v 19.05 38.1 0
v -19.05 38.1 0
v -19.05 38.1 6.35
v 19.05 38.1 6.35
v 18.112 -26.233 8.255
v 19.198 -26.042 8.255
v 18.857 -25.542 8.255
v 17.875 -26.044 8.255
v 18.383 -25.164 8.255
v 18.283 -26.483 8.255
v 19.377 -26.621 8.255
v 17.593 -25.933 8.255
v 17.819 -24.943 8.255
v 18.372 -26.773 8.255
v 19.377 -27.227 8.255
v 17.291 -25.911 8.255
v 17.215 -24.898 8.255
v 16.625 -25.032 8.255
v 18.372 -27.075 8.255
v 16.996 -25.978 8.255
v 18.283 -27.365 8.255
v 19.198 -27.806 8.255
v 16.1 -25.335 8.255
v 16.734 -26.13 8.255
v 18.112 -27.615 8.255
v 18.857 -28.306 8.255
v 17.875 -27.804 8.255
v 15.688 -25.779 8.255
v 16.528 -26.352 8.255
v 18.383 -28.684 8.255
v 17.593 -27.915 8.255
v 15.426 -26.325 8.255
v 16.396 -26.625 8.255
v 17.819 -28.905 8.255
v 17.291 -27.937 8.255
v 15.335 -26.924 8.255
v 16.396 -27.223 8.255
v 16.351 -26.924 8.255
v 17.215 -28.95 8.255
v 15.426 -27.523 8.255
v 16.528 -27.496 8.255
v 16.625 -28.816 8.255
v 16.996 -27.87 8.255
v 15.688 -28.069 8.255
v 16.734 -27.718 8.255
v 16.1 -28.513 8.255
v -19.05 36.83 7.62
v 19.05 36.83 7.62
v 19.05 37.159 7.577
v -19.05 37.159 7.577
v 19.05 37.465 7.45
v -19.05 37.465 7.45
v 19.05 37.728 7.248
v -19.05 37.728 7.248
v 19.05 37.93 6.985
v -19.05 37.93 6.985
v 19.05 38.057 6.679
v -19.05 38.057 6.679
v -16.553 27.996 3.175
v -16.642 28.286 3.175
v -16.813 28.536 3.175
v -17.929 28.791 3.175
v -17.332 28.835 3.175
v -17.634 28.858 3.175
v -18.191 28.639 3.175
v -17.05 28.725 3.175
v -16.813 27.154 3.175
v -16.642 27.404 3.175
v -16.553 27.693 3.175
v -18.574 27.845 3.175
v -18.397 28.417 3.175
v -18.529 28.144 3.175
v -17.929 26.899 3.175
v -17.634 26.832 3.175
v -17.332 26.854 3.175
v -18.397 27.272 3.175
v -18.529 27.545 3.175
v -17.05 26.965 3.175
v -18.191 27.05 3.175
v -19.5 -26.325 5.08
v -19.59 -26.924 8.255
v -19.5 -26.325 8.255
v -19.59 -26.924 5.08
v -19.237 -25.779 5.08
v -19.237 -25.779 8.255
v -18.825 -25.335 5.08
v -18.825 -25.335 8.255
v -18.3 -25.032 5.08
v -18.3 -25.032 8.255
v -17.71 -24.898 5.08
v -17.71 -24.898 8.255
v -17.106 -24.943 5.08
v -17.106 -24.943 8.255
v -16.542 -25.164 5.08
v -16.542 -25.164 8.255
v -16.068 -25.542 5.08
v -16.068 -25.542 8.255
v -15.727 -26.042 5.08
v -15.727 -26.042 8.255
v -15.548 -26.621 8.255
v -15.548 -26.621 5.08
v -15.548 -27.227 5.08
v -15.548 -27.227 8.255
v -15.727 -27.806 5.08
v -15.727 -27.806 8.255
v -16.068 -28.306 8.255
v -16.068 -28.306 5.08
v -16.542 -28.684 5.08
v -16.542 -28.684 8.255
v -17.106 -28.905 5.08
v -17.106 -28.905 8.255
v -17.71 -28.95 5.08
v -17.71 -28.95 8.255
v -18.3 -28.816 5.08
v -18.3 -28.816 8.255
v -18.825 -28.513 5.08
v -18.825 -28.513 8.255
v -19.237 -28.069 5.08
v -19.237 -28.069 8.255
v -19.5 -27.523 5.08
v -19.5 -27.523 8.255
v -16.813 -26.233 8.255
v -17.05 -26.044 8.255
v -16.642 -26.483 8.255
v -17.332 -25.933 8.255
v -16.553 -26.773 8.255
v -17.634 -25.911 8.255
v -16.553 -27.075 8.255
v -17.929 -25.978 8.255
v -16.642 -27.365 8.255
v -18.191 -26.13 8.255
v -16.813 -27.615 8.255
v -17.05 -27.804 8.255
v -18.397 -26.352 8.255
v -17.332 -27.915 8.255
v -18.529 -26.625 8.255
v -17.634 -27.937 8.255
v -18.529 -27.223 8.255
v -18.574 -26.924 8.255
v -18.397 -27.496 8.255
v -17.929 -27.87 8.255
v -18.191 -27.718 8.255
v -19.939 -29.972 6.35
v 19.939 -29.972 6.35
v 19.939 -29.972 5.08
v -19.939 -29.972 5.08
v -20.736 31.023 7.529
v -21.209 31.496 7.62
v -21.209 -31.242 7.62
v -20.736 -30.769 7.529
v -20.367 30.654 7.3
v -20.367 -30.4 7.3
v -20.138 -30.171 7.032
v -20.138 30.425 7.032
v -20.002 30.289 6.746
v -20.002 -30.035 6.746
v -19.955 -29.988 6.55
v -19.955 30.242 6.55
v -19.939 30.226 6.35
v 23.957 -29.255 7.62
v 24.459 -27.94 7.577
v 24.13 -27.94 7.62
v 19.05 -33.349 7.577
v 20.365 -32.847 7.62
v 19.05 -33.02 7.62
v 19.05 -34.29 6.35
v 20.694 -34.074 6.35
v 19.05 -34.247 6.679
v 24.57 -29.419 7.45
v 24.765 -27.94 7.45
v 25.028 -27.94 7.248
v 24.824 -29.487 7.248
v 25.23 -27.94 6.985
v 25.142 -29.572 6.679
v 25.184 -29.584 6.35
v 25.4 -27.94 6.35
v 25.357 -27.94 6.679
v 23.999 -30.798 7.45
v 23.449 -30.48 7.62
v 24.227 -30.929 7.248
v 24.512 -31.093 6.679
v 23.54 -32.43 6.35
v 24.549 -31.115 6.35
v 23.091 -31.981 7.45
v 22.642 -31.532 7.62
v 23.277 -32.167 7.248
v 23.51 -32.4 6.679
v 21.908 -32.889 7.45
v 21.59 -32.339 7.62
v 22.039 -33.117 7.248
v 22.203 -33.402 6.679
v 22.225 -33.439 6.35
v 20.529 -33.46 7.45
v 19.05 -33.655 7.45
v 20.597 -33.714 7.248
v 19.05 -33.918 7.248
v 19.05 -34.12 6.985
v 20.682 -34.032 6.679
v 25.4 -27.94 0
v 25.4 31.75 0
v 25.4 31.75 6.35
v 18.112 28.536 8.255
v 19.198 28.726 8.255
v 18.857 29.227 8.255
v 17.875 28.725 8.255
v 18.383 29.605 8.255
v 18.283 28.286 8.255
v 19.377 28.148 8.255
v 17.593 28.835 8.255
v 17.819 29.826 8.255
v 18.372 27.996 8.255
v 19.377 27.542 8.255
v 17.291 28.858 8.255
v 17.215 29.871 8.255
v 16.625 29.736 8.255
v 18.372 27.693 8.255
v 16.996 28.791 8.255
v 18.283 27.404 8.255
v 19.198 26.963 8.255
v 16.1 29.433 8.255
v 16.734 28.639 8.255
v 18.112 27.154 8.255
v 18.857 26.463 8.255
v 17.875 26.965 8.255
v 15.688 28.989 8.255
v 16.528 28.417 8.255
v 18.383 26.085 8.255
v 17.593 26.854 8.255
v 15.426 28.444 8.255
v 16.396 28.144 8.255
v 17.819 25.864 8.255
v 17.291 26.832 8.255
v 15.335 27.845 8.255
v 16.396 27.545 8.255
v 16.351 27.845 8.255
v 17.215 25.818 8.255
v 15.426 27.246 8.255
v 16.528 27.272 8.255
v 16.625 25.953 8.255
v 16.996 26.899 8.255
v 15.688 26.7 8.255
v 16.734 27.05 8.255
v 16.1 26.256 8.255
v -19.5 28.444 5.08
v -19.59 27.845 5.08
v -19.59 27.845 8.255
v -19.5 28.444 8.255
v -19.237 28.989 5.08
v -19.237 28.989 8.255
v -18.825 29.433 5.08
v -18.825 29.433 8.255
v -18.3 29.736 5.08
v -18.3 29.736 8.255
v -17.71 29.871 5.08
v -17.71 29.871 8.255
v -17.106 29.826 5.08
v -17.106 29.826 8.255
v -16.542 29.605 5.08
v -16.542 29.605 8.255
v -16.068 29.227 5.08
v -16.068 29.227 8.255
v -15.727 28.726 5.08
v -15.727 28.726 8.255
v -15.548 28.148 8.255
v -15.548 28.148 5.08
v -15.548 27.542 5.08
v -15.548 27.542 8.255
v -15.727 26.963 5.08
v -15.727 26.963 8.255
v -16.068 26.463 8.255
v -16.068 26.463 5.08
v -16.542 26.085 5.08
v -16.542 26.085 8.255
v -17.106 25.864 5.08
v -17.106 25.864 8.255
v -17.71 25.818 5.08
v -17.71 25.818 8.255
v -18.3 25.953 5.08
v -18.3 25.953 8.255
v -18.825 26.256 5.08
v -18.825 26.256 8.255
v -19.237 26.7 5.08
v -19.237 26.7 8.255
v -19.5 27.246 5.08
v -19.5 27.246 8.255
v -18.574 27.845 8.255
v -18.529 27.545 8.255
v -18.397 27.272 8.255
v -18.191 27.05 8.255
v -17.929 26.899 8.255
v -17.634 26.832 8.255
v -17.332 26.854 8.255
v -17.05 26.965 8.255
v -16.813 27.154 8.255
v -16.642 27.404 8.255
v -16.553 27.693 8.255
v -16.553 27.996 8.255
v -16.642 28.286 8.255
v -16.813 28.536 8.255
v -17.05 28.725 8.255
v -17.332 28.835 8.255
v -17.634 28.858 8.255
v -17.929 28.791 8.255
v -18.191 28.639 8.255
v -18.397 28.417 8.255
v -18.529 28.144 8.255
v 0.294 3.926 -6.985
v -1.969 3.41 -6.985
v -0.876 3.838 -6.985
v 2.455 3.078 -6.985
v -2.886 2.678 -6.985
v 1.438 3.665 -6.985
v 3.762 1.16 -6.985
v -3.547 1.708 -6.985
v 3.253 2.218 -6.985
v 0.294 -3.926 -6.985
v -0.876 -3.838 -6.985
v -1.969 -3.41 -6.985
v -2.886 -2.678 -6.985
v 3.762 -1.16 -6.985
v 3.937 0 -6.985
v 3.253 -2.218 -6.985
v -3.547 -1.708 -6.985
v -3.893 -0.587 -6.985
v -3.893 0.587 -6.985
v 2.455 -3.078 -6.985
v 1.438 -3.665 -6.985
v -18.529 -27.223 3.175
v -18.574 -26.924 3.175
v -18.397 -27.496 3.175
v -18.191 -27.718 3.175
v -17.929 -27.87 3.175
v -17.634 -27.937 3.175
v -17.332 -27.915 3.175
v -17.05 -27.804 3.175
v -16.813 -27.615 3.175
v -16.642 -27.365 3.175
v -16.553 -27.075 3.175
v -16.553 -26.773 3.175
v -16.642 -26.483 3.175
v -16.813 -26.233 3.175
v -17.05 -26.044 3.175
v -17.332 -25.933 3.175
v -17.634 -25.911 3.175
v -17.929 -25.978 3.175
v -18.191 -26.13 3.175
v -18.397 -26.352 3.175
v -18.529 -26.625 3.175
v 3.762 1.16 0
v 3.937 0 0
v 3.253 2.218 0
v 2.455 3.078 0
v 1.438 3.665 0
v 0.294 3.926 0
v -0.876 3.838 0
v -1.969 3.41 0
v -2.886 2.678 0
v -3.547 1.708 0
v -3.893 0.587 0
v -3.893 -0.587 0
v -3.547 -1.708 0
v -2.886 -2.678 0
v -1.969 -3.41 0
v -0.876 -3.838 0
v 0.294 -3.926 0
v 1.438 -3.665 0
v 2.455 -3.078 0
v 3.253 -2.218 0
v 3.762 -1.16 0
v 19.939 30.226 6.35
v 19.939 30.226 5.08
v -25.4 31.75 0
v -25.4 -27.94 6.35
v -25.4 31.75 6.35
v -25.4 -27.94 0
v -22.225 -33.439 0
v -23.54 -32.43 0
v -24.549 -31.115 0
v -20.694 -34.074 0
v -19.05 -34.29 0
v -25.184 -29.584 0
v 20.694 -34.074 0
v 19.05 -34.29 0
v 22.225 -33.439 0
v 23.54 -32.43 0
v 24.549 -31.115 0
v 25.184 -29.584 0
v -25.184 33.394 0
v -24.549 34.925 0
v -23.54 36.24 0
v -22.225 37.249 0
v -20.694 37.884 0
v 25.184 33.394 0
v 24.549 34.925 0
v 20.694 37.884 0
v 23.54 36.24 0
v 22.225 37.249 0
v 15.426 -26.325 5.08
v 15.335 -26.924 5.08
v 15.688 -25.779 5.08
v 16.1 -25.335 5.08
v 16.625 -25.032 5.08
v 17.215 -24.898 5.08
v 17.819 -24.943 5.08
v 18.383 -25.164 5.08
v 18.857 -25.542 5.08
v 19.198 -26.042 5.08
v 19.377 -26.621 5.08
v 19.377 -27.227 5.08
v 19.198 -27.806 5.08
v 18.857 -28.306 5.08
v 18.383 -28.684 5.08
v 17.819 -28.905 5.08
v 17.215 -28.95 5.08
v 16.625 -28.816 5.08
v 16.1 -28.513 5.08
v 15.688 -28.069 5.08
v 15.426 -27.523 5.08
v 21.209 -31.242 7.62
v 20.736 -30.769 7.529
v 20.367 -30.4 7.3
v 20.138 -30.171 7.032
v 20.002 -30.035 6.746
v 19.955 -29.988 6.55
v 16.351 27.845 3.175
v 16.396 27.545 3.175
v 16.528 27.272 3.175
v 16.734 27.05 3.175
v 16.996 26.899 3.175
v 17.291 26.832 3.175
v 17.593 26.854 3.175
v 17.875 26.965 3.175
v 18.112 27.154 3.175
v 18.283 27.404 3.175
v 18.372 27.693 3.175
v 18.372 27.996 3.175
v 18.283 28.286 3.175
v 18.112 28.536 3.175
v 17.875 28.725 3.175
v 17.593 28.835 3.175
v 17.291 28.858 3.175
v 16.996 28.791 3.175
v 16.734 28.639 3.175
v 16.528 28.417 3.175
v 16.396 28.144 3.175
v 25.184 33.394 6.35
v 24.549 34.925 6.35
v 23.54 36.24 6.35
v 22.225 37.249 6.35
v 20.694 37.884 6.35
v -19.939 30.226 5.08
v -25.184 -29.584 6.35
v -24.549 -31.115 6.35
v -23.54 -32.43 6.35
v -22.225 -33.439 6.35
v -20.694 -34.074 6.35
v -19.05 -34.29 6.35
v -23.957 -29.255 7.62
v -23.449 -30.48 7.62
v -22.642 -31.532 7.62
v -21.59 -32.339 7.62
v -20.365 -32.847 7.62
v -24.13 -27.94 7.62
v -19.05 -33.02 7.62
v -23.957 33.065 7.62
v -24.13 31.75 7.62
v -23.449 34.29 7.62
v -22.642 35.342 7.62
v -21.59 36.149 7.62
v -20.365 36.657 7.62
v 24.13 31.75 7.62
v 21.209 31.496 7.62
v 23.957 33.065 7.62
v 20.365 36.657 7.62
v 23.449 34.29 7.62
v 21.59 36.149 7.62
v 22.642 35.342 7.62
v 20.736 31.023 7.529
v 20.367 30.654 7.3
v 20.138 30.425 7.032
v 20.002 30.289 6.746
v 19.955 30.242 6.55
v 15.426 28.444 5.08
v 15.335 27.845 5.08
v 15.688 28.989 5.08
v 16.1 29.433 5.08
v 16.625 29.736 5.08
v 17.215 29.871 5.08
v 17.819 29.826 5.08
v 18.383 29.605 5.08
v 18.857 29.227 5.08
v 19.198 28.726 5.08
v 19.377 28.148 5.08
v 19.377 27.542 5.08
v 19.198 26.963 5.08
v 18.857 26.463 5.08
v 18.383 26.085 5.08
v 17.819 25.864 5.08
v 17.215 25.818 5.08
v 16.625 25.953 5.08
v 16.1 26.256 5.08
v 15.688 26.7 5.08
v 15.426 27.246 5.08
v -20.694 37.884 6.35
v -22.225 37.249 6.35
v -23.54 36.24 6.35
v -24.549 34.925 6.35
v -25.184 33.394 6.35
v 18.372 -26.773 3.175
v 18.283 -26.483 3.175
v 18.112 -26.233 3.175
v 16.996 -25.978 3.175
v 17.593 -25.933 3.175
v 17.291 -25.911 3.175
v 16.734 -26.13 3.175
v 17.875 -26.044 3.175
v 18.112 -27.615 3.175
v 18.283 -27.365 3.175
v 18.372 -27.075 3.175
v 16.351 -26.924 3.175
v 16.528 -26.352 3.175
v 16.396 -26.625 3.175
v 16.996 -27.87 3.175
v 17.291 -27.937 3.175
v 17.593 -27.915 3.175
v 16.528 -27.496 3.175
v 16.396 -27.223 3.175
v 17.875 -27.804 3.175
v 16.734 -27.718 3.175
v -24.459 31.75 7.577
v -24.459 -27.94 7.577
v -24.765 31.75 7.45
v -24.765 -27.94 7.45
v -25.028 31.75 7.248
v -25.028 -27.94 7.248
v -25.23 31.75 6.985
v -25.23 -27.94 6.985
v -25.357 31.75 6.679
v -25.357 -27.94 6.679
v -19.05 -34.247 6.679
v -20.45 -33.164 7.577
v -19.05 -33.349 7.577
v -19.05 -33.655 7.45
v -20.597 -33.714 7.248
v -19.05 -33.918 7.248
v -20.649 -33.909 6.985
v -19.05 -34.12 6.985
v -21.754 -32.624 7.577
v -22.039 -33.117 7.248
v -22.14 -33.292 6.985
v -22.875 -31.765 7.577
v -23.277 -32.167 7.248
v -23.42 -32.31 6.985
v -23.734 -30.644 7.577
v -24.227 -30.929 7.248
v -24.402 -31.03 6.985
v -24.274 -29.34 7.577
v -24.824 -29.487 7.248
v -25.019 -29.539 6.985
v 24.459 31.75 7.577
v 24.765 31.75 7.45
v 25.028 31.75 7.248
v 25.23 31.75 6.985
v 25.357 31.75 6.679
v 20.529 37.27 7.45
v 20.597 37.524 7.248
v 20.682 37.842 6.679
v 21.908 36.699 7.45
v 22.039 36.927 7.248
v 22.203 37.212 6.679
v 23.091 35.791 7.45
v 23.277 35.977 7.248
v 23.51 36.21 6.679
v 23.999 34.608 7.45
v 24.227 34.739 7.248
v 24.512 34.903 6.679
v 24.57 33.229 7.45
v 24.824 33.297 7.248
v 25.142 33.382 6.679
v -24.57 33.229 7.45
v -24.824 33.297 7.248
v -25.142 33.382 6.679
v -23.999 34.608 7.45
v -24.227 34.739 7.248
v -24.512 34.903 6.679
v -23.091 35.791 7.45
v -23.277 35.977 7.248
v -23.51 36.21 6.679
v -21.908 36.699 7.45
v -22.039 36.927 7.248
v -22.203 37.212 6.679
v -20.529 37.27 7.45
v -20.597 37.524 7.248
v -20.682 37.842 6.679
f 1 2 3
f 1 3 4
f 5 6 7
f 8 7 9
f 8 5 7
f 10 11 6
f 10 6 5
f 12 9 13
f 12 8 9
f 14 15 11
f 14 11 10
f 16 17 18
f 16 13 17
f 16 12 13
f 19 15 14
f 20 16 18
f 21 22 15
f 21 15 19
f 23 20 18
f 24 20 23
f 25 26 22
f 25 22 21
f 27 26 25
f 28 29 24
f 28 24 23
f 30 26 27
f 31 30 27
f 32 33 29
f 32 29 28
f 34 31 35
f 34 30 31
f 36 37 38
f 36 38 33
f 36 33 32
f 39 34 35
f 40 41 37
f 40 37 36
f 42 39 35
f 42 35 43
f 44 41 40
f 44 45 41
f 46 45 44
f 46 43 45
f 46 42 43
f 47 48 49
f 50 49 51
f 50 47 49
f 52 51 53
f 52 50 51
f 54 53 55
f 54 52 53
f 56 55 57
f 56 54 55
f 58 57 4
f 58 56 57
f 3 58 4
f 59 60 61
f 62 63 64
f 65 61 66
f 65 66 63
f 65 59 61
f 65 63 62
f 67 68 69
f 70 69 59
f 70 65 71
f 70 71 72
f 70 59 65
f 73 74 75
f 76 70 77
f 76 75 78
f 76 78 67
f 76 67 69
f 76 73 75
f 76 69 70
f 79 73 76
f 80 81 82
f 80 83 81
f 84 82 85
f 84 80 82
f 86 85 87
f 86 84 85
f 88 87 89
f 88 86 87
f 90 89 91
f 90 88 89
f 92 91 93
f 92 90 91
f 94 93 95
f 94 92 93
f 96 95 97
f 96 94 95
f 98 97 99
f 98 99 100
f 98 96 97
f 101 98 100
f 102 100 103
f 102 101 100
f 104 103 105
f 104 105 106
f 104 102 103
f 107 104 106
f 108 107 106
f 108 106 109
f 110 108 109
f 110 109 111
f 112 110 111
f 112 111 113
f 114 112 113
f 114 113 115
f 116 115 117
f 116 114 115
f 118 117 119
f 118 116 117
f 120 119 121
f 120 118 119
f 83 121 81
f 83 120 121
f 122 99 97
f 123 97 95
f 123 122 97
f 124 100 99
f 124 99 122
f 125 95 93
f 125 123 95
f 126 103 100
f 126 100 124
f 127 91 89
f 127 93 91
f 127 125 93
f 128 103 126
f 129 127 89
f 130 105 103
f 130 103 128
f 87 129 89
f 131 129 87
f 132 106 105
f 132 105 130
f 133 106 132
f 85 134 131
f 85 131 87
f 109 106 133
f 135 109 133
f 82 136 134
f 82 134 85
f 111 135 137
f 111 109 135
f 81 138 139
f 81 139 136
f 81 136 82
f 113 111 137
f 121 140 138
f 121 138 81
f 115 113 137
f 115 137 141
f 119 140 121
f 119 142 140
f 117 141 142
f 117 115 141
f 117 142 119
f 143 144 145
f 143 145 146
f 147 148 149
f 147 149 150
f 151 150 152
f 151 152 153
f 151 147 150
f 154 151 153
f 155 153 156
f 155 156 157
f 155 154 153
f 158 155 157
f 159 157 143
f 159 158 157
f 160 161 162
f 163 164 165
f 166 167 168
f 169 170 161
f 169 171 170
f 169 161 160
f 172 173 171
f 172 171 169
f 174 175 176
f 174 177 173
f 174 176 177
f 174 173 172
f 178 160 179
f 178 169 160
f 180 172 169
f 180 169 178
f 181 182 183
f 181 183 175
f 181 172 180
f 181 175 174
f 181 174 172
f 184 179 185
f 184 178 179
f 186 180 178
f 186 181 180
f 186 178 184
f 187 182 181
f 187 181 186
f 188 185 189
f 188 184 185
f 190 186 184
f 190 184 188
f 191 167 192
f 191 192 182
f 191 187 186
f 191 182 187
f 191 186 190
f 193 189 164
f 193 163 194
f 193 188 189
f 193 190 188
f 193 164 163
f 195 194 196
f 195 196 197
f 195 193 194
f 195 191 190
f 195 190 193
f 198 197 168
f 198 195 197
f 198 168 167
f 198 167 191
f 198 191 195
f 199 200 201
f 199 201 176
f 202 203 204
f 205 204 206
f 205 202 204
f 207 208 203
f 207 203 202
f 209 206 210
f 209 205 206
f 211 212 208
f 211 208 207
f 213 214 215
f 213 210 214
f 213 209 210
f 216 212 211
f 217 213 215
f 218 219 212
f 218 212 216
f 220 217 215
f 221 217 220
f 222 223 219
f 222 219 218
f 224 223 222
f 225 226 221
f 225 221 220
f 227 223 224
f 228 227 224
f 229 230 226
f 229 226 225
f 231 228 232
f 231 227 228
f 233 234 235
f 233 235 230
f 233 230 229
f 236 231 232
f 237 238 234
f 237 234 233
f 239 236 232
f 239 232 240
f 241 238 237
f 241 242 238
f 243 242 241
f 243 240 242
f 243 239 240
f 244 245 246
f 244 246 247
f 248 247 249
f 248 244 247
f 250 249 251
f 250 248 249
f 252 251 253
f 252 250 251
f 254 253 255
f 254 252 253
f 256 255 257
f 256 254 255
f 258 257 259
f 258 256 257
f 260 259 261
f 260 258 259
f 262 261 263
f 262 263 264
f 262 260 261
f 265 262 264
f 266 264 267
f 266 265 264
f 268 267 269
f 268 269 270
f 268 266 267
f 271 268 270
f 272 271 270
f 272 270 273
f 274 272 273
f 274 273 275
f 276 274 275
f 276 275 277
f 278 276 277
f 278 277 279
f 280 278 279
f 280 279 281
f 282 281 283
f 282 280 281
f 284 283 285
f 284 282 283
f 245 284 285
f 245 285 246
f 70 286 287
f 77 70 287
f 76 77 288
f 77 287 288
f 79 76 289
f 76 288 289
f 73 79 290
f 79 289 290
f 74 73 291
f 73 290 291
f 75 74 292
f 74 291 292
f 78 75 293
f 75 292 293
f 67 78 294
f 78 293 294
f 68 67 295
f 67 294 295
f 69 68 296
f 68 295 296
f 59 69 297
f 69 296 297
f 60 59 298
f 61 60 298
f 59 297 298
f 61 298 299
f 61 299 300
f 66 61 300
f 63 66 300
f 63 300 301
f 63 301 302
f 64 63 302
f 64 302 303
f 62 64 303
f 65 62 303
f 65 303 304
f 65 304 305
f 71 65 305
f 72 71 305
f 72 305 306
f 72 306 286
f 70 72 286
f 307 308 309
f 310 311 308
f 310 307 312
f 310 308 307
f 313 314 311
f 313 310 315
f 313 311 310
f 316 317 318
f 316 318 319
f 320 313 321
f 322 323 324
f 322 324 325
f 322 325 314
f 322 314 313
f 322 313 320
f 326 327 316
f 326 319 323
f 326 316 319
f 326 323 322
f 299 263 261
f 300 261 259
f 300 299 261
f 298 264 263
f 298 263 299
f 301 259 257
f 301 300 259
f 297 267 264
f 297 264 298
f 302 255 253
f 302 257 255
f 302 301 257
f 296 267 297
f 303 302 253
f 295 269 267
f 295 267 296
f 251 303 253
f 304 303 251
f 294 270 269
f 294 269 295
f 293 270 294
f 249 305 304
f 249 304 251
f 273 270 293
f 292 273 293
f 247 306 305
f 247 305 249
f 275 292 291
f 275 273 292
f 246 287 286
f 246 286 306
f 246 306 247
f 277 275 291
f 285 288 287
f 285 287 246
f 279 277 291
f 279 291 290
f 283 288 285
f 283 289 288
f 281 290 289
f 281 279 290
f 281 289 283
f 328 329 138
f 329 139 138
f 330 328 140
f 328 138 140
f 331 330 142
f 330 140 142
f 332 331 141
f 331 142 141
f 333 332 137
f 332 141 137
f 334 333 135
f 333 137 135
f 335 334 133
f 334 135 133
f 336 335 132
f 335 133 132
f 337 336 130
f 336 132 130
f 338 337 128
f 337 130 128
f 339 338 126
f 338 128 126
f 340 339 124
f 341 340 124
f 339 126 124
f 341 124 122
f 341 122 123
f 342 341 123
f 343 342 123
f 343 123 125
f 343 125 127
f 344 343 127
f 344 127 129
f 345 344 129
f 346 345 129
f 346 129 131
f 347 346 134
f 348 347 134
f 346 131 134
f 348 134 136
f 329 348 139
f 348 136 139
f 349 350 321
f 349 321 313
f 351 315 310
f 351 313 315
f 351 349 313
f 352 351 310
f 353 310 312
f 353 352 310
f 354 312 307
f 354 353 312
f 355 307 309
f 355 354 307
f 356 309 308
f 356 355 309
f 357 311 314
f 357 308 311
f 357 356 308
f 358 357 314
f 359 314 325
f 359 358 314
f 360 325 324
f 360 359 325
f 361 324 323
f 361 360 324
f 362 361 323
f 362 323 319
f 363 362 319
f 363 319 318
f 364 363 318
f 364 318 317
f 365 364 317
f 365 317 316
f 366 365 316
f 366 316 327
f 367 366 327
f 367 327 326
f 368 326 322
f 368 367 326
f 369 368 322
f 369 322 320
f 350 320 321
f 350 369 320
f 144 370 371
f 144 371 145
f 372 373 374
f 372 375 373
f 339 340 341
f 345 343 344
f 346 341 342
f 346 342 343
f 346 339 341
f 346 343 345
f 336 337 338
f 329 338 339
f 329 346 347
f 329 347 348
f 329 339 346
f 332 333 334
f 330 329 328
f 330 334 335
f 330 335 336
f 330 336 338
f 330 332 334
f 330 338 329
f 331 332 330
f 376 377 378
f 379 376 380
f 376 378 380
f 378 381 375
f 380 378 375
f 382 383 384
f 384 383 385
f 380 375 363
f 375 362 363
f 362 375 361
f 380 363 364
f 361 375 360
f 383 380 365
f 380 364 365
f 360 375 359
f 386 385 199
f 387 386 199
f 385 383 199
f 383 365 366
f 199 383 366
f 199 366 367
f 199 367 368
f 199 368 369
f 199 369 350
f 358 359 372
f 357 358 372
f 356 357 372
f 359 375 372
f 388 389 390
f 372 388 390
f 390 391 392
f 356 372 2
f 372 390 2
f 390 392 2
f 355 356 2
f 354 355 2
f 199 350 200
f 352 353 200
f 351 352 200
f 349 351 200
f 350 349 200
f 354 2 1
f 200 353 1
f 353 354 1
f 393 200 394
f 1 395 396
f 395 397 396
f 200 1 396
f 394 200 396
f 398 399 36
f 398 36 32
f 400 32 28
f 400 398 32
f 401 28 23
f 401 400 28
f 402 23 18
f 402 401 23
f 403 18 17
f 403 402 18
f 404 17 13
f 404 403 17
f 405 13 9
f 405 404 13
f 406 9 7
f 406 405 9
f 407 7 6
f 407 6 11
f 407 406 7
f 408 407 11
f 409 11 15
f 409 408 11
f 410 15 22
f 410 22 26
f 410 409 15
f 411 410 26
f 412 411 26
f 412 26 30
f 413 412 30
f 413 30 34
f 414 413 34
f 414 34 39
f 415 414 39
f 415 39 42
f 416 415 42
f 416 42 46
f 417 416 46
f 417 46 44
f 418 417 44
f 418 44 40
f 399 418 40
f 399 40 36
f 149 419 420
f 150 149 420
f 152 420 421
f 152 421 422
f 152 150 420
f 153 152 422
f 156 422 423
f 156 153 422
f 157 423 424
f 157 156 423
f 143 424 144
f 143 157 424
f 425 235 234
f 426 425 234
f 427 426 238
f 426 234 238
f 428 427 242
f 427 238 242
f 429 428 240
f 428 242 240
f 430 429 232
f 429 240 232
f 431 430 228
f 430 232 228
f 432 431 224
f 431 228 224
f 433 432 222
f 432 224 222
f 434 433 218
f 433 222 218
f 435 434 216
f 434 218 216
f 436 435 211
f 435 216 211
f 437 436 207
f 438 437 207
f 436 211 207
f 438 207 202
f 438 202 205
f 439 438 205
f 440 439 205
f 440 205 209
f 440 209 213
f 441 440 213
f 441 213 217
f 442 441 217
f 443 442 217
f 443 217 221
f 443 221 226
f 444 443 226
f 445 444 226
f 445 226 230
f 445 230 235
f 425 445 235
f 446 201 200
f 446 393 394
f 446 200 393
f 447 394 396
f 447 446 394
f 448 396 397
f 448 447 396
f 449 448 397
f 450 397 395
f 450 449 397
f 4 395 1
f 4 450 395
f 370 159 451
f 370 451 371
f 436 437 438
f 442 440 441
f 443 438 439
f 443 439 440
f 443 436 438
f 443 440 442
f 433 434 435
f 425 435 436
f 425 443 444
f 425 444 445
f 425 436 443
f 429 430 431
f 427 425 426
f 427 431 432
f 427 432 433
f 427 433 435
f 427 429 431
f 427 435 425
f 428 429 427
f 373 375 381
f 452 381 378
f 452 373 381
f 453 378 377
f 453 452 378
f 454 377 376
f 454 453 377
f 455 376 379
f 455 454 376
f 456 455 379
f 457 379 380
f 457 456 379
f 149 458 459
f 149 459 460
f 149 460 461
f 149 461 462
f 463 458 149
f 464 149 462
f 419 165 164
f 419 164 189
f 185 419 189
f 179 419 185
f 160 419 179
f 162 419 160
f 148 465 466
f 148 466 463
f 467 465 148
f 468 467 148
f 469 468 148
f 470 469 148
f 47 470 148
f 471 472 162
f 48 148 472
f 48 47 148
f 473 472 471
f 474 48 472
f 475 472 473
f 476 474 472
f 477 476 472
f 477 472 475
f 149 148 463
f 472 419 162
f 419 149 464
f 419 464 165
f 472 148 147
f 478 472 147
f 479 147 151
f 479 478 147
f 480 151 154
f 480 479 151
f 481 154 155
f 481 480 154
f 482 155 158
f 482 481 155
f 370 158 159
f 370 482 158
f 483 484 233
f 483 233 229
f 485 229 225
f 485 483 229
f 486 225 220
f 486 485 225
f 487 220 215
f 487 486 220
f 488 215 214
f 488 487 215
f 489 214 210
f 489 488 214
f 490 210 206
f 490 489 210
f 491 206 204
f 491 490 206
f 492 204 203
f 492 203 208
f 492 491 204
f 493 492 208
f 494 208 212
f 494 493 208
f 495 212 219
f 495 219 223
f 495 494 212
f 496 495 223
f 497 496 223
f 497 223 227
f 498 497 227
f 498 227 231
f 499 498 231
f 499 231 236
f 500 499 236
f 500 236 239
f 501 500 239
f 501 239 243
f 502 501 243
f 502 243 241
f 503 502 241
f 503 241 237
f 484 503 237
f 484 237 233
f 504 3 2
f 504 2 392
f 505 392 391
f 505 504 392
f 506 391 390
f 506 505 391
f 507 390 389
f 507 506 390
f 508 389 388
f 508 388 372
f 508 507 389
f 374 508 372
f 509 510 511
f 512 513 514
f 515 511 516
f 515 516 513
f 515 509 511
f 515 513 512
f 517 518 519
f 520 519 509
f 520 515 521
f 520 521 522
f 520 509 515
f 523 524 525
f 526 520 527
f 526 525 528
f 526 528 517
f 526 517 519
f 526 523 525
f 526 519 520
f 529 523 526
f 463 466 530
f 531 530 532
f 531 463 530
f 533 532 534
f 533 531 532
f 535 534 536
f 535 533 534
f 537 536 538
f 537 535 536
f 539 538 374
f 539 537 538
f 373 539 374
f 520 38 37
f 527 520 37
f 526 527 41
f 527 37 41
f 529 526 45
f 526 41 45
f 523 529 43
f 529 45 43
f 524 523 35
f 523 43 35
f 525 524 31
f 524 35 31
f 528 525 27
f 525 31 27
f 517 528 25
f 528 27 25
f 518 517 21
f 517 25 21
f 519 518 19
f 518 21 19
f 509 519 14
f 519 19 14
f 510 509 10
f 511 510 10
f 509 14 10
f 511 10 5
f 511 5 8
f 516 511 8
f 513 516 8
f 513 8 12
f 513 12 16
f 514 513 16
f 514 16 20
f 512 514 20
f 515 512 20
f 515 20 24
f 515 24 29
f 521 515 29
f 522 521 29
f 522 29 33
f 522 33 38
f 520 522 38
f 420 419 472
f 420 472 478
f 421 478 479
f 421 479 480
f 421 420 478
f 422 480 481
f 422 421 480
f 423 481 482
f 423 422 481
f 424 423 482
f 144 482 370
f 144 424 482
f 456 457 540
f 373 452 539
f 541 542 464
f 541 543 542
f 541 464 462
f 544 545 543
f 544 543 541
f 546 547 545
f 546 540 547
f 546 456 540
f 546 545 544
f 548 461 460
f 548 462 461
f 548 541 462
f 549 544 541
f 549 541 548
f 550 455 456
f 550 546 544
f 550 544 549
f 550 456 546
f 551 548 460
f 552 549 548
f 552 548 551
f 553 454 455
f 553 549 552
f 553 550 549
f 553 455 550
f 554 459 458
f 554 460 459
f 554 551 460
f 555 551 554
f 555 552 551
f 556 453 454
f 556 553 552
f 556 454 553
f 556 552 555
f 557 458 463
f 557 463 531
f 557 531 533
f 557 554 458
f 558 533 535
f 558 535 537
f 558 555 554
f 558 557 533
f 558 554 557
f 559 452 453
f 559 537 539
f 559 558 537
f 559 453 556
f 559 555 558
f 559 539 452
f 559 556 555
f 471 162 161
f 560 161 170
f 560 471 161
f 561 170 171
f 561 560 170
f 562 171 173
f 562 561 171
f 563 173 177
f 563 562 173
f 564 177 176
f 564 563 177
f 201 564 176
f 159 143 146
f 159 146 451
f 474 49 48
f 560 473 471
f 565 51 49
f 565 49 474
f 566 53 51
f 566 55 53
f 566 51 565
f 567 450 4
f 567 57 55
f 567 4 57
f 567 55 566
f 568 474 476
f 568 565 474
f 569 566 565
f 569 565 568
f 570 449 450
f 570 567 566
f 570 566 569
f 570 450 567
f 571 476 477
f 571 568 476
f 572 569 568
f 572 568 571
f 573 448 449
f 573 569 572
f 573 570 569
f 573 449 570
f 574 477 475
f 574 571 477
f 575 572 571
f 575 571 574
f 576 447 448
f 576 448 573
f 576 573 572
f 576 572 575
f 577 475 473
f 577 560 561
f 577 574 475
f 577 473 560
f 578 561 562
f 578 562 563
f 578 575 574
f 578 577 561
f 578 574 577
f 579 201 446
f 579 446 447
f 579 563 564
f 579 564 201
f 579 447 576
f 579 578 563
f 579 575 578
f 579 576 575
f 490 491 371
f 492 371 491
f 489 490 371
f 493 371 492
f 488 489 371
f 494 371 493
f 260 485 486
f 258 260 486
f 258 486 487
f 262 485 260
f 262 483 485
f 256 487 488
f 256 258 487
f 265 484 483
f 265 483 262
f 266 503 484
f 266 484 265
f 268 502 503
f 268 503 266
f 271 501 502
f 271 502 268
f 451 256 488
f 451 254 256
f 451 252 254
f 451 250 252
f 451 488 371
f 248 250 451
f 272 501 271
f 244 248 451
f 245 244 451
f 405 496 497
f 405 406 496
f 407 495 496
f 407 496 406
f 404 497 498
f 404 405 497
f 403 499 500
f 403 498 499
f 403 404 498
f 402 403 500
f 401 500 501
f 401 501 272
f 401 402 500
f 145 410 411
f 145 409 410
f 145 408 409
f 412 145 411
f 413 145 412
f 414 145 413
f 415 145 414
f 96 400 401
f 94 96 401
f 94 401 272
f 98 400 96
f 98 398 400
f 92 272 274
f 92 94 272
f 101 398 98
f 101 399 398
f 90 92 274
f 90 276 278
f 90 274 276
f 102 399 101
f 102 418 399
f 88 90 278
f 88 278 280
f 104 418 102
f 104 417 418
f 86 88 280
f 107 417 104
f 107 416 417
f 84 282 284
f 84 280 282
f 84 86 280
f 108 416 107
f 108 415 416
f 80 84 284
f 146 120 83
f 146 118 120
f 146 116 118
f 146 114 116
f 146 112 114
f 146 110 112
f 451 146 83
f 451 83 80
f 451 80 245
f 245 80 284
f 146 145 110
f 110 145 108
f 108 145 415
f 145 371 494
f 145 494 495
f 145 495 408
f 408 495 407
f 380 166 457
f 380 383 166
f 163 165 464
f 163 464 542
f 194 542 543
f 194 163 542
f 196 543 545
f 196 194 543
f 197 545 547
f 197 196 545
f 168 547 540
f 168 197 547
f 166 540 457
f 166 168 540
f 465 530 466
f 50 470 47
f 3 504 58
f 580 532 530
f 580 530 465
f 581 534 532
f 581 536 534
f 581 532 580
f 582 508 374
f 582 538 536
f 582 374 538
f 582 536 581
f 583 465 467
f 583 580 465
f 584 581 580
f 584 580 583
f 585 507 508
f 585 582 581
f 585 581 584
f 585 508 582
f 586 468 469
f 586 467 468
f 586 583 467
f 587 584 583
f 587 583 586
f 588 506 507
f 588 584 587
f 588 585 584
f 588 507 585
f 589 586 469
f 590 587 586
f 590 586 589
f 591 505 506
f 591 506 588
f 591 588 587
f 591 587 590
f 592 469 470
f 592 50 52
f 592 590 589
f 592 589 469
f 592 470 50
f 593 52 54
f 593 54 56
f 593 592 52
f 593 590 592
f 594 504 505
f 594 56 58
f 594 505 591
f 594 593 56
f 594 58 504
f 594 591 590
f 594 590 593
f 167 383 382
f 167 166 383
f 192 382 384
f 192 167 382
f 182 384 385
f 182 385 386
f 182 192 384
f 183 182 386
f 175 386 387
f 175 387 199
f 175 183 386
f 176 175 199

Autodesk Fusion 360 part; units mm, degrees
sketch "Sketch1" plane through (0, 0, 0) normal (0, 0, 1) x (1, 0, 0)
  line L0 (-25.4, 38.1) -> (25.4, 38.1)
  line L1 (25.4, 38.1) -> (25.4, -34.29)
  line L2 (25.4, -34.29) -> (-25.4, -34.29)
  line L3 (-25.4, -34.29) -> (-25.4, 38.1)
  dimension "d1" = 50.8
  dimension "d2" = 72.39
extrude "Extrude1" add sketch "Sketch1" along normal blind 7.62
sketch "Sketch2" plane through (0, 0, 0) normal (0, 0, -1) x (1, 0, 0)
  line L0 (25.4, 34.29) -> (-25.4, 34.29)
  line L1 (-25.4, 34.29) -> (-25.4, -38.1)
  line L2 (-25.4, -38.1) -> (25.4, -38.1)
  line L3 (25.4, -38.1) -> (25.4, 34.29)
  circle A0 centre (0, 0) radius 3.937
  dimension "d5" = 7.874
extrude "Extrude2" add sketch "Sketch2" along normal blind 6.985 contours A0
sketch "Sketch3" plane through (0, 0, 7.62) normal (0, 0, 1) x (-1, 0, 0)
  line L0 (25.4, 34.29) -> (-25.4, 34.29)
  line L1 (-25.4, 34.29) -> (-25.4, -38.1)
  line L2 (-25.4, -38.1) -> (25.4, -38.1)
  line L3 (25.4, -38.1) -> (25.4, 34.29)
  line L4 (0, 0) -> (-19.939, 0)
  line L5 (-19.939, 0) -> (-19.939, 29.972)
  line L6 (-19.939, 29.972) -> (19.939, 29.972)
  line L7 (19.939, 29.972) -> (19.939, -30.226)
  line L8 (19.939, -30.226) -> (-19.939, -30.226)
  line L9 (-19.939, -30.226) -> (-19.939, 29.972)
  dimension "d8" = 19.939
  dimension "d9" = 29.972
  dimension "d10" = 39.878
  dimension "d11" = 60.198
extrude "Extrude3" cut sketch "Sketch3" against normal blind 2.54 contours L5 L6 L7 L8 L9
fillet "Fillet1" radius 1.27 4 edges at (19.939, 0.127, 7.62) (0, -29.972, 7.62) (-19.939, 0.127, 7.62) (0, 30.226, 7.62)
fillet "Fillet2" radius 6.35 4 edges at (-25.4, 38.1, 3.81) (-25.4, -34.29, 3.81) (25.4, -34.29, 3.81) (25.4, 38.1, 3.81)
sketch "Sketch4" plane through (0, 0, 5.08) normal (0, 0, 1) x (-1, 0, 0)
  line L0 (-19.939, -30.226) -> (19.939, -30.226)
  line L1 (19.939, -30.226) -> (19.939, 29.972)
  line L2 (19.939, 29.972) -> (-19.939, 29.972)
  line L3 (-19.939, 29.972) -> (-19.939, -30.226)
  line L4 (19.939, -30.226) -> (17.5578, -30.226)
  line L5 (17.5578, -30.226) -> (17.5578, -27.8448)
  line L6 (17.5578, -27.8448) -> (-17.3673, -27.8448)
  line L7 (-17.3673, -27.8448) -> (-17.3673, 26.924)
  line L8 (17.5578, -27.8448) -> (-17.3673, -27.8448)
  line L9 (-17.3673, -27.8448) -> (-17.3673, 26.924)
  line L10 (-17.3673, 26.924) -> (17.5578, 26.924)
  line L11 (17.5578, 26.924) -> (17.5578, -27.8448)
  circle A0 centre (17.5578, 26.924) radius 2.032
  circle A1 centre (17.5578, -27.8448) radius 2.032
  circle A2 centre (-17.3673, -27.8448) radius 2.032
  circle A3 centre (-17.3673, 26.924) radius 2.032
  dimension "d18" = 2.3813
  dimension "d19" = 2.3813
  dimension "d20" = 34.925
  dimension "d21" = 54.7687
  dimension "d22" = 4.064
  dimension "d23" = 4.064
  dimension "d24" = 4.064
  dimension "d25" = 4.064
extrude "Extrude4" add sketch "Sketch4" along normal blind 3.175 contours L5 L6 L8 A1 | L5 L11 A1 | L6 L8 L11 A1 | L6 L7 L8 L9 A2 | L6 L7 L8 L9 A2 | L10 L11 A0 | L10 L11 A0 | L7 L9 L10 A3 | L7 L9 L10 A3
sketch "Sketch5" plane through (0, 0, 8.255) normal (0, 0, 1) x (-1, 0, 0)
  circle A0 centre (17.5578, -27.8448) radius 2.032
  circle A1 centre (17.5578, -27.8448) radius 1.016
  dimension "d28" = 2.032
sketch "Sketch6" plane through (0, 0, 8.255) normal (0, 0, 1) x (-1, 0, 0)
  circle A0 centre (-17.3673, -27.8448) radius 2.032
  circle A1 centre (-17.3673, -27.8448) radius 1.016
  dimension "d29" = 2.032
sketch "Sketch7" plane through (0, 0, 8.255) normal (0, 0, 1) x (-1, 0, 0)
  circle A0 centre (17.5578, 26.924) radius 2.032
  circle A1 centre (17.5578, 26.924) radius 1.016
  dimension "d30" = 2.032
sketch "Sketch8" plane through (0, 0, 8.255) normal (0, 0, 1) x (-1, 0, 0)
  circle A0 centre (-17.3673, 26.924) radius 2.032
  circle A1 centre (-17.3673, 26.924) radius 1.016
  dimension "d31" = 2.032
extrude "Extrude5" cut sketch "Sketch5" sketch "Sketch7" sketch "Sketch6" sketch "Sketch8" against normal blind 5.08 contours A1 of sketch 2 contours A1 of sketch 3 contours A1 of sketch 4 contours A1
fillet "Fillet3" radius 1.27 8 edges at (23.5401, -32.4301, 7.62) (25.4, 1.905, 7.62) (23.5401, 36.2401, 7.62) (0, 38.1, 7.62) (-23.5401, 36.2401, 7.62) (-25.4, 1.905, 7.62) (-23.5401, -32.4301, 7.62) (0, -34.29, 7.62)
equation "d8 = ( 1.57 / 2 ) * 1 in"
equation "d9 = ( 2.36 / 2 ) * 1 in"
equation "d18 = ( 3 / 32 ) * 1 in"
equation "d19 = ( 3 / 32 ) * 1 in"
equation "d26 = ( 1 / 8 ) * 1 in"
